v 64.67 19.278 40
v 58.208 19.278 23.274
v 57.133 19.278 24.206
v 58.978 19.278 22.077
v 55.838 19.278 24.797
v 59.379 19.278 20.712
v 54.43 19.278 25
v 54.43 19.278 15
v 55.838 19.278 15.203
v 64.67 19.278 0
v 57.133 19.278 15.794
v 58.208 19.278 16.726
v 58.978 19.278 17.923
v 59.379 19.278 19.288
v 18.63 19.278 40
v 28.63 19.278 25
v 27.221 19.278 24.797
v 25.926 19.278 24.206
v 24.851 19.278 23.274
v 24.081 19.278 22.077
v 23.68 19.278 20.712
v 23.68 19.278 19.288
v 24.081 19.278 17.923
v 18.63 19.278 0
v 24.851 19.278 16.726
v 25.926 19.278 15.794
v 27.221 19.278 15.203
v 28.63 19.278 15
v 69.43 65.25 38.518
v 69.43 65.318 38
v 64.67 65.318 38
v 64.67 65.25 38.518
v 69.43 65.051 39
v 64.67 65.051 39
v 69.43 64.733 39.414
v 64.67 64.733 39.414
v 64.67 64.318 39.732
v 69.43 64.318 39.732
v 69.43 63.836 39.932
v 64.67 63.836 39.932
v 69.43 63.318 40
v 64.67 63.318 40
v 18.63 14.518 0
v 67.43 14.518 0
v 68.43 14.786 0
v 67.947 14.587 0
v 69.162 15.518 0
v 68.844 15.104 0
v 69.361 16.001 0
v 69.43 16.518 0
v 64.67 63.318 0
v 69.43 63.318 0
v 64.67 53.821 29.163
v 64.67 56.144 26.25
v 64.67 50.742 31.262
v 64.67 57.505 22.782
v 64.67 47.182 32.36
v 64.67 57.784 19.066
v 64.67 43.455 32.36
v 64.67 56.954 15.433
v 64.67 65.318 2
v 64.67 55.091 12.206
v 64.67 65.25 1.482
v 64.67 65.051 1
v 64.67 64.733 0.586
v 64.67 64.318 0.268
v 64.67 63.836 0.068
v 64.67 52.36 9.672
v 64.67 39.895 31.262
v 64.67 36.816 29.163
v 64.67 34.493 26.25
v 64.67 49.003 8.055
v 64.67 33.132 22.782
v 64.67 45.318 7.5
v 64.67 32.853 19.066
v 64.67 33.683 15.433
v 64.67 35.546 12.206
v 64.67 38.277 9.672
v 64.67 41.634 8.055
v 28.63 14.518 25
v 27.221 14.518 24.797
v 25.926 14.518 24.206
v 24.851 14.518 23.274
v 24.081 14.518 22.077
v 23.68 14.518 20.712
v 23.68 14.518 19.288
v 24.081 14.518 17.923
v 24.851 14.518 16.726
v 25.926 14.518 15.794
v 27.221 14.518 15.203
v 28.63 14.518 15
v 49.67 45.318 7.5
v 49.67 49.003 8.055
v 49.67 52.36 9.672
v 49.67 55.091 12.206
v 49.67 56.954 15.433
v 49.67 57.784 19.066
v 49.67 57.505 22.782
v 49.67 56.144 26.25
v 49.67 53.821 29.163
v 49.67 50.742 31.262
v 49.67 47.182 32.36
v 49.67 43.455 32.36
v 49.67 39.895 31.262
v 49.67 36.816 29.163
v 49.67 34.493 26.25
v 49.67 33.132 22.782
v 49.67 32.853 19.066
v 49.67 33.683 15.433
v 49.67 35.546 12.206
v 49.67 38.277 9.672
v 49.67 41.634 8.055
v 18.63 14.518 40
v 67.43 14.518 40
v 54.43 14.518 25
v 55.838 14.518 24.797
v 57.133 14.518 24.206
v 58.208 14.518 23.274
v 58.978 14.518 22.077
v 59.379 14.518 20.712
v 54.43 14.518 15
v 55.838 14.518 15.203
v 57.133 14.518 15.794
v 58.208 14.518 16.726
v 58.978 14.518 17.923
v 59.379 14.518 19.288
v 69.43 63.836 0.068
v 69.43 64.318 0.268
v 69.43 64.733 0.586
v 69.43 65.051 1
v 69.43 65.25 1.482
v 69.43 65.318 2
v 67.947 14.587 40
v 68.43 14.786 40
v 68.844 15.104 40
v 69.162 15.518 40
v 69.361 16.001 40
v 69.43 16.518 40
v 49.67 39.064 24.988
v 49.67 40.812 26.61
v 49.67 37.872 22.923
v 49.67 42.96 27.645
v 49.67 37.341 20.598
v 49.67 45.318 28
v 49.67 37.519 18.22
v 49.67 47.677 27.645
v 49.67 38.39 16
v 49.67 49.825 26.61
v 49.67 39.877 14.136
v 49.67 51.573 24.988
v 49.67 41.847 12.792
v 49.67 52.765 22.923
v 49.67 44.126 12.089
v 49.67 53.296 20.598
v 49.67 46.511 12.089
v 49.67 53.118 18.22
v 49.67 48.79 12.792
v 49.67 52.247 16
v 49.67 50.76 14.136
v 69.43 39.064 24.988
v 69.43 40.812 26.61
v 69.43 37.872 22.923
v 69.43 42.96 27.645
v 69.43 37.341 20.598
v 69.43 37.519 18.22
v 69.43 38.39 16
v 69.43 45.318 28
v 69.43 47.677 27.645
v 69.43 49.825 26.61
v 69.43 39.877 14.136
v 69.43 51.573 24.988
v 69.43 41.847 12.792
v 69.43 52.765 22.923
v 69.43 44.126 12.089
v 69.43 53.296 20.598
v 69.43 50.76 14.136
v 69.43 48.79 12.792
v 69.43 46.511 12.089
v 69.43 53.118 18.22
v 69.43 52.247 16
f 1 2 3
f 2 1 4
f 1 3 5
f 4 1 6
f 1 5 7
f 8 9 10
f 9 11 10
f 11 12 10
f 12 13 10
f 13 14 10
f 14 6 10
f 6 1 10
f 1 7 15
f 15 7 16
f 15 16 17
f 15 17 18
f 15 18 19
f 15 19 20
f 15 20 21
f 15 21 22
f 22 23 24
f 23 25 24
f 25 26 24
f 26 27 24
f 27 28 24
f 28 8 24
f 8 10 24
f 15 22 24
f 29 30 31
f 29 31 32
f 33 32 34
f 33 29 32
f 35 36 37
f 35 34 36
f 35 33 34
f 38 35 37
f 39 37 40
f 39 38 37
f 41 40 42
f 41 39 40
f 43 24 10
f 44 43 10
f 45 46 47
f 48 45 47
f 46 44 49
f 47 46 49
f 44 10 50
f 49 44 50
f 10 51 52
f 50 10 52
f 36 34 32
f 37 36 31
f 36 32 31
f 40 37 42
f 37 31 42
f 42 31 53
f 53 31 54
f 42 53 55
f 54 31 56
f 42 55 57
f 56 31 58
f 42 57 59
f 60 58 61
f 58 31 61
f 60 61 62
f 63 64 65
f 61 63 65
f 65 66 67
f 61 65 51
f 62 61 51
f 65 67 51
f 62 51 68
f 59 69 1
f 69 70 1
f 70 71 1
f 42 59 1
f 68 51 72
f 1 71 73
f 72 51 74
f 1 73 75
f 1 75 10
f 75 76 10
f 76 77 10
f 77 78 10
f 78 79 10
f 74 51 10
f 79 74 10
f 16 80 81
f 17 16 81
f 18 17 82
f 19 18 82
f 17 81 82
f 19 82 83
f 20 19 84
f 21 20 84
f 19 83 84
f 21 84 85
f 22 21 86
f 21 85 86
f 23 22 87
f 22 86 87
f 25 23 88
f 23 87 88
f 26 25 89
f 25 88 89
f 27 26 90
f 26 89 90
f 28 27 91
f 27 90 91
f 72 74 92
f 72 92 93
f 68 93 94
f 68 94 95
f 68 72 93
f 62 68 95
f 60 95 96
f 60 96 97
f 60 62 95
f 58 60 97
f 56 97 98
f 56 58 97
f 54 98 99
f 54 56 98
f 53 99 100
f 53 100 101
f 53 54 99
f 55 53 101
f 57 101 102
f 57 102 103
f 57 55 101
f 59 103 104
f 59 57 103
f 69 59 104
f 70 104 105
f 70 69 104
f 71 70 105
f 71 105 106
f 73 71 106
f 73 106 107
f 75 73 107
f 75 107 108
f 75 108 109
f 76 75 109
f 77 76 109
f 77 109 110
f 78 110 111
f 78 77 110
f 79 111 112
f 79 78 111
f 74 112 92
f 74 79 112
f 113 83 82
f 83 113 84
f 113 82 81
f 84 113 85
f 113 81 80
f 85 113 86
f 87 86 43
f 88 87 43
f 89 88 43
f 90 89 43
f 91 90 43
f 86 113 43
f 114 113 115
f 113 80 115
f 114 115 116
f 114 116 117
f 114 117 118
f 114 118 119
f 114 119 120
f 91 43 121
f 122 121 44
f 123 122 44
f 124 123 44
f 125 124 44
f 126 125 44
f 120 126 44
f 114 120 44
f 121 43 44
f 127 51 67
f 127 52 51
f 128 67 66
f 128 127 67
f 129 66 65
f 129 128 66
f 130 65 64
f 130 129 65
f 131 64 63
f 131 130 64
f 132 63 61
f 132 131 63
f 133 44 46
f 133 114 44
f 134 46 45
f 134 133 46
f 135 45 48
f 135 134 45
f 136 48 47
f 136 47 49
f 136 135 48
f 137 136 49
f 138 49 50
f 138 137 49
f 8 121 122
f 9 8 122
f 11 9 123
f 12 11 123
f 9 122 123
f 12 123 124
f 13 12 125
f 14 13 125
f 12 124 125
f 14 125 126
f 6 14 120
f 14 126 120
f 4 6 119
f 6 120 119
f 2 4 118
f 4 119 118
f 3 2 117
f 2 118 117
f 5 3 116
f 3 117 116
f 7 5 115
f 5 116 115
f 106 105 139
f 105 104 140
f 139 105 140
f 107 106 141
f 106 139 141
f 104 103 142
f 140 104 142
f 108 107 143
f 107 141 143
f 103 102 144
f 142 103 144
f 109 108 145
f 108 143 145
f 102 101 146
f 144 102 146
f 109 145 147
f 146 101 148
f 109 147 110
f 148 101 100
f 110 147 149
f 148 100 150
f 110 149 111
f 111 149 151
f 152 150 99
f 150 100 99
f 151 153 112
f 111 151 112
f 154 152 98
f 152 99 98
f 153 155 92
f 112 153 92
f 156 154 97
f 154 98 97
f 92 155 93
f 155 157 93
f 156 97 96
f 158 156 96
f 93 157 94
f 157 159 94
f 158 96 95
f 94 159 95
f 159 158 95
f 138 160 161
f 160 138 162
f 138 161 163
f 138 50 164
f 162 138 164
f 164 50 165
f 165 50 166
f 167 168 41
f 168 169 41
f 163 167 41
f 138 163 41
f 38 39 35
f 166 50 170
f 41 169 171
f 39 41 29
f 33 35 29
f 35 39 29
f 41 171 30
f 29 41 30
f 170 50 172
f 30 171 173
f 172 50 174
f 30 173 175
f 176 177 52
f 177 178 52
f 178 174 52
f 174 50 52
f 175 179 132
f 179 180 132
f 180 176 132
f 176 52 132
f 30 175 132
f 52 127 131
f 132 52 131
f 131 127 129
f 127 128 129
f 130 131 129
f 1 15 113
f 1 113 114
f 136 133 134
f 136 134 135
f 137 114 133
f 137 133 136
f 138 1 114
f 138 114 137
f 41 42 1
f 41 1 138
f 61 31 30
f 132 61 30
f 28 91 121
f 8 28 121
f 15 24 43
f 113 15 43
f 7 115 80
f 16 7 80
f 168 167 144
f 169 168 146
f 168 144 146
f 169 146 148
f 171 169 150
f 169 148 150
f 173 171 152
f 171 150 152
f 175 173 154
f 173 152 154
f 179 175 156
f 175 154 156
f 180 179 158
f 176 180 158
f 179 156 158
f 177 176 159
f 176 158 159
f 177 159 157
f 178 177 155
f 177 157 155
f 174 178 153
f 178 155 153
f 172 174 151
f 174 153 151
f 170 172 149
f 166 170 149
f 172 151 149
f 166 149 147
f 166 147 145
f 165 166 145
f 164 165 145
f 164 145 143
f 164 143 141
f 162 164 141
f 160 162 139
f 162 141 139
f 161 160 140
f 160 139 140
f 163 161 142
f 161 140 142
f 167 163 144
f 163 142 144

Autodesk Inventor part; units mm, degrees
ref_plane "YZ Plane" through (0, 0, 0) normal (1, 0, 0) x (0, 1, 0)
ref_plane "XZ Plane" through (0, 0, 0) normal (0, 1, 0) x (-1, 0, 0)
ref_plane "XY Plane" through (0, 0, 0) normal (0, 0, 1) x (1, 0, 0)
sketch "Sketch1" plane through (0, 0, 0) normal (0, 0, 1) x (1, 0, 0)
  line L0 (18.6296, 14.5185) -> (69.4296, 14.5185)
  line L1 (69.4296, 14.5185) -> (69.4296, 65.3185)
  line L2 (64.6696, 65.3185) -> (64.6696, 19.2785)
  line L3 (64.6696, 19.2785) -> (18.6296, 19.2785)
  line L4 (18.6296, 19.2785) -> (18.6296, 14.5185)
  line L5 (64.6696, 65.3185) -> (69.4296, 65.3185)
  point P0 (0, 0)
  dimension "d1" = 50.8
  dimension "d2" = 50.8
  dimension "d3" = 4.76
extrude "Extrusion1" add sketch "Sketch1" along normal blind 40
sketch "Sketch2" plane through (69.4296, 14.5185, 0) normal (1, 0, 0) x (0, 0, -1)
  line L0 (-40, 50.8) -> (0, 0)
  line L1 (-40, 0) -> (0, 50.0964)
  circle A0 centre (-20, 30.8) radius 12.5
  line L2 (0, 50.8) -> (-40, 50.8) projected
  line L3 (0, 0) -> (0, 50.8) projected
  point P0 (0, -14.5185)
  dimension "d6" = 25
  dimension "d7" = 20
  dimension "d8" = 20
extrude "Extrusion2" add sketch "Sketch2" against normal blind 19.76 contours A0 L1 L0 | L0 L1 A0 | L1 A0 L0 | L0 A0 L1
sketch "Sketch3" plane through (49.6696, 45.3185, 20) normal (-1, 0, 0) x (0, 0, 1)
  circle A0 centre (0, 0) radius 8
  point P0 (-20, -45.3185)
  dimension "d11" = 16
extrude "Extrusion3" cut sketch "Sketch3" against normal blind 19.76
sketch "Sketch4" plane through (18.6296, 14.5185, 0) normal (0, -1, 0) x (1, 0, 0)
  arc A0 (35.8, 15) -> (35.8, 25) centre (35.8, 20) ccw
  arc A1 (10, 25) -> (10, 15) centre (10, 20) ccw
  line L0 (50.8, 0) -> (50.8, 40) projected
  line L1 (0, 0) -> (0, 40) projected
  line L2 (0, 40) -> (50.8, 40) projected
  line L3 (35.8, 25) -> (10, 25)
  line L4 (10, 15) -> (35.8, 15)
  point P0 (-18.6296, 0)
  dimension "d14" = 10
  dimension "d15" = 10
  dimension "d16" = 15
  dimension "d17" = 10
  dimension "d18" = 20
  dimension "d19" = 20
extrude "Extrusion4" cut sketch "Sketch4" against normal blind 6
fillet "Fillet1" radius 2 1 edges at (69.4296, 14.5185, 20)
fillet "Fillet2" radius 2 2 edges at (67.0496, 65.3185, 40) (67.0496, 65.3185, 0)
sketch "Sketch5" plane through (18.6296, 19.2785, 0) normal (0, 1, 0) x (1, 0, 0)
  arc A0 (35.8, -25) -> (35.8, -15) centre (35.8, -20) ccw projected
  arc A1 (35.8, -25) -> (35.8, -15) centre (35.8, -20) ccw projected
  arc A2 (10, -15) -> (10, -25) centre (10, -20) ccw projected
  line L0 (10, -15) -> (35.8, -15) projected
  line L1 (35.8, -15) -> (10, -15) projected
  line L2 (35.8, -25) -> (10, -25) projected
  point P0 (-18.6296, 0)
equation "\"d19\" = d18"
properties part number "Mancal_Movel" material "SAE 1010/1020"
